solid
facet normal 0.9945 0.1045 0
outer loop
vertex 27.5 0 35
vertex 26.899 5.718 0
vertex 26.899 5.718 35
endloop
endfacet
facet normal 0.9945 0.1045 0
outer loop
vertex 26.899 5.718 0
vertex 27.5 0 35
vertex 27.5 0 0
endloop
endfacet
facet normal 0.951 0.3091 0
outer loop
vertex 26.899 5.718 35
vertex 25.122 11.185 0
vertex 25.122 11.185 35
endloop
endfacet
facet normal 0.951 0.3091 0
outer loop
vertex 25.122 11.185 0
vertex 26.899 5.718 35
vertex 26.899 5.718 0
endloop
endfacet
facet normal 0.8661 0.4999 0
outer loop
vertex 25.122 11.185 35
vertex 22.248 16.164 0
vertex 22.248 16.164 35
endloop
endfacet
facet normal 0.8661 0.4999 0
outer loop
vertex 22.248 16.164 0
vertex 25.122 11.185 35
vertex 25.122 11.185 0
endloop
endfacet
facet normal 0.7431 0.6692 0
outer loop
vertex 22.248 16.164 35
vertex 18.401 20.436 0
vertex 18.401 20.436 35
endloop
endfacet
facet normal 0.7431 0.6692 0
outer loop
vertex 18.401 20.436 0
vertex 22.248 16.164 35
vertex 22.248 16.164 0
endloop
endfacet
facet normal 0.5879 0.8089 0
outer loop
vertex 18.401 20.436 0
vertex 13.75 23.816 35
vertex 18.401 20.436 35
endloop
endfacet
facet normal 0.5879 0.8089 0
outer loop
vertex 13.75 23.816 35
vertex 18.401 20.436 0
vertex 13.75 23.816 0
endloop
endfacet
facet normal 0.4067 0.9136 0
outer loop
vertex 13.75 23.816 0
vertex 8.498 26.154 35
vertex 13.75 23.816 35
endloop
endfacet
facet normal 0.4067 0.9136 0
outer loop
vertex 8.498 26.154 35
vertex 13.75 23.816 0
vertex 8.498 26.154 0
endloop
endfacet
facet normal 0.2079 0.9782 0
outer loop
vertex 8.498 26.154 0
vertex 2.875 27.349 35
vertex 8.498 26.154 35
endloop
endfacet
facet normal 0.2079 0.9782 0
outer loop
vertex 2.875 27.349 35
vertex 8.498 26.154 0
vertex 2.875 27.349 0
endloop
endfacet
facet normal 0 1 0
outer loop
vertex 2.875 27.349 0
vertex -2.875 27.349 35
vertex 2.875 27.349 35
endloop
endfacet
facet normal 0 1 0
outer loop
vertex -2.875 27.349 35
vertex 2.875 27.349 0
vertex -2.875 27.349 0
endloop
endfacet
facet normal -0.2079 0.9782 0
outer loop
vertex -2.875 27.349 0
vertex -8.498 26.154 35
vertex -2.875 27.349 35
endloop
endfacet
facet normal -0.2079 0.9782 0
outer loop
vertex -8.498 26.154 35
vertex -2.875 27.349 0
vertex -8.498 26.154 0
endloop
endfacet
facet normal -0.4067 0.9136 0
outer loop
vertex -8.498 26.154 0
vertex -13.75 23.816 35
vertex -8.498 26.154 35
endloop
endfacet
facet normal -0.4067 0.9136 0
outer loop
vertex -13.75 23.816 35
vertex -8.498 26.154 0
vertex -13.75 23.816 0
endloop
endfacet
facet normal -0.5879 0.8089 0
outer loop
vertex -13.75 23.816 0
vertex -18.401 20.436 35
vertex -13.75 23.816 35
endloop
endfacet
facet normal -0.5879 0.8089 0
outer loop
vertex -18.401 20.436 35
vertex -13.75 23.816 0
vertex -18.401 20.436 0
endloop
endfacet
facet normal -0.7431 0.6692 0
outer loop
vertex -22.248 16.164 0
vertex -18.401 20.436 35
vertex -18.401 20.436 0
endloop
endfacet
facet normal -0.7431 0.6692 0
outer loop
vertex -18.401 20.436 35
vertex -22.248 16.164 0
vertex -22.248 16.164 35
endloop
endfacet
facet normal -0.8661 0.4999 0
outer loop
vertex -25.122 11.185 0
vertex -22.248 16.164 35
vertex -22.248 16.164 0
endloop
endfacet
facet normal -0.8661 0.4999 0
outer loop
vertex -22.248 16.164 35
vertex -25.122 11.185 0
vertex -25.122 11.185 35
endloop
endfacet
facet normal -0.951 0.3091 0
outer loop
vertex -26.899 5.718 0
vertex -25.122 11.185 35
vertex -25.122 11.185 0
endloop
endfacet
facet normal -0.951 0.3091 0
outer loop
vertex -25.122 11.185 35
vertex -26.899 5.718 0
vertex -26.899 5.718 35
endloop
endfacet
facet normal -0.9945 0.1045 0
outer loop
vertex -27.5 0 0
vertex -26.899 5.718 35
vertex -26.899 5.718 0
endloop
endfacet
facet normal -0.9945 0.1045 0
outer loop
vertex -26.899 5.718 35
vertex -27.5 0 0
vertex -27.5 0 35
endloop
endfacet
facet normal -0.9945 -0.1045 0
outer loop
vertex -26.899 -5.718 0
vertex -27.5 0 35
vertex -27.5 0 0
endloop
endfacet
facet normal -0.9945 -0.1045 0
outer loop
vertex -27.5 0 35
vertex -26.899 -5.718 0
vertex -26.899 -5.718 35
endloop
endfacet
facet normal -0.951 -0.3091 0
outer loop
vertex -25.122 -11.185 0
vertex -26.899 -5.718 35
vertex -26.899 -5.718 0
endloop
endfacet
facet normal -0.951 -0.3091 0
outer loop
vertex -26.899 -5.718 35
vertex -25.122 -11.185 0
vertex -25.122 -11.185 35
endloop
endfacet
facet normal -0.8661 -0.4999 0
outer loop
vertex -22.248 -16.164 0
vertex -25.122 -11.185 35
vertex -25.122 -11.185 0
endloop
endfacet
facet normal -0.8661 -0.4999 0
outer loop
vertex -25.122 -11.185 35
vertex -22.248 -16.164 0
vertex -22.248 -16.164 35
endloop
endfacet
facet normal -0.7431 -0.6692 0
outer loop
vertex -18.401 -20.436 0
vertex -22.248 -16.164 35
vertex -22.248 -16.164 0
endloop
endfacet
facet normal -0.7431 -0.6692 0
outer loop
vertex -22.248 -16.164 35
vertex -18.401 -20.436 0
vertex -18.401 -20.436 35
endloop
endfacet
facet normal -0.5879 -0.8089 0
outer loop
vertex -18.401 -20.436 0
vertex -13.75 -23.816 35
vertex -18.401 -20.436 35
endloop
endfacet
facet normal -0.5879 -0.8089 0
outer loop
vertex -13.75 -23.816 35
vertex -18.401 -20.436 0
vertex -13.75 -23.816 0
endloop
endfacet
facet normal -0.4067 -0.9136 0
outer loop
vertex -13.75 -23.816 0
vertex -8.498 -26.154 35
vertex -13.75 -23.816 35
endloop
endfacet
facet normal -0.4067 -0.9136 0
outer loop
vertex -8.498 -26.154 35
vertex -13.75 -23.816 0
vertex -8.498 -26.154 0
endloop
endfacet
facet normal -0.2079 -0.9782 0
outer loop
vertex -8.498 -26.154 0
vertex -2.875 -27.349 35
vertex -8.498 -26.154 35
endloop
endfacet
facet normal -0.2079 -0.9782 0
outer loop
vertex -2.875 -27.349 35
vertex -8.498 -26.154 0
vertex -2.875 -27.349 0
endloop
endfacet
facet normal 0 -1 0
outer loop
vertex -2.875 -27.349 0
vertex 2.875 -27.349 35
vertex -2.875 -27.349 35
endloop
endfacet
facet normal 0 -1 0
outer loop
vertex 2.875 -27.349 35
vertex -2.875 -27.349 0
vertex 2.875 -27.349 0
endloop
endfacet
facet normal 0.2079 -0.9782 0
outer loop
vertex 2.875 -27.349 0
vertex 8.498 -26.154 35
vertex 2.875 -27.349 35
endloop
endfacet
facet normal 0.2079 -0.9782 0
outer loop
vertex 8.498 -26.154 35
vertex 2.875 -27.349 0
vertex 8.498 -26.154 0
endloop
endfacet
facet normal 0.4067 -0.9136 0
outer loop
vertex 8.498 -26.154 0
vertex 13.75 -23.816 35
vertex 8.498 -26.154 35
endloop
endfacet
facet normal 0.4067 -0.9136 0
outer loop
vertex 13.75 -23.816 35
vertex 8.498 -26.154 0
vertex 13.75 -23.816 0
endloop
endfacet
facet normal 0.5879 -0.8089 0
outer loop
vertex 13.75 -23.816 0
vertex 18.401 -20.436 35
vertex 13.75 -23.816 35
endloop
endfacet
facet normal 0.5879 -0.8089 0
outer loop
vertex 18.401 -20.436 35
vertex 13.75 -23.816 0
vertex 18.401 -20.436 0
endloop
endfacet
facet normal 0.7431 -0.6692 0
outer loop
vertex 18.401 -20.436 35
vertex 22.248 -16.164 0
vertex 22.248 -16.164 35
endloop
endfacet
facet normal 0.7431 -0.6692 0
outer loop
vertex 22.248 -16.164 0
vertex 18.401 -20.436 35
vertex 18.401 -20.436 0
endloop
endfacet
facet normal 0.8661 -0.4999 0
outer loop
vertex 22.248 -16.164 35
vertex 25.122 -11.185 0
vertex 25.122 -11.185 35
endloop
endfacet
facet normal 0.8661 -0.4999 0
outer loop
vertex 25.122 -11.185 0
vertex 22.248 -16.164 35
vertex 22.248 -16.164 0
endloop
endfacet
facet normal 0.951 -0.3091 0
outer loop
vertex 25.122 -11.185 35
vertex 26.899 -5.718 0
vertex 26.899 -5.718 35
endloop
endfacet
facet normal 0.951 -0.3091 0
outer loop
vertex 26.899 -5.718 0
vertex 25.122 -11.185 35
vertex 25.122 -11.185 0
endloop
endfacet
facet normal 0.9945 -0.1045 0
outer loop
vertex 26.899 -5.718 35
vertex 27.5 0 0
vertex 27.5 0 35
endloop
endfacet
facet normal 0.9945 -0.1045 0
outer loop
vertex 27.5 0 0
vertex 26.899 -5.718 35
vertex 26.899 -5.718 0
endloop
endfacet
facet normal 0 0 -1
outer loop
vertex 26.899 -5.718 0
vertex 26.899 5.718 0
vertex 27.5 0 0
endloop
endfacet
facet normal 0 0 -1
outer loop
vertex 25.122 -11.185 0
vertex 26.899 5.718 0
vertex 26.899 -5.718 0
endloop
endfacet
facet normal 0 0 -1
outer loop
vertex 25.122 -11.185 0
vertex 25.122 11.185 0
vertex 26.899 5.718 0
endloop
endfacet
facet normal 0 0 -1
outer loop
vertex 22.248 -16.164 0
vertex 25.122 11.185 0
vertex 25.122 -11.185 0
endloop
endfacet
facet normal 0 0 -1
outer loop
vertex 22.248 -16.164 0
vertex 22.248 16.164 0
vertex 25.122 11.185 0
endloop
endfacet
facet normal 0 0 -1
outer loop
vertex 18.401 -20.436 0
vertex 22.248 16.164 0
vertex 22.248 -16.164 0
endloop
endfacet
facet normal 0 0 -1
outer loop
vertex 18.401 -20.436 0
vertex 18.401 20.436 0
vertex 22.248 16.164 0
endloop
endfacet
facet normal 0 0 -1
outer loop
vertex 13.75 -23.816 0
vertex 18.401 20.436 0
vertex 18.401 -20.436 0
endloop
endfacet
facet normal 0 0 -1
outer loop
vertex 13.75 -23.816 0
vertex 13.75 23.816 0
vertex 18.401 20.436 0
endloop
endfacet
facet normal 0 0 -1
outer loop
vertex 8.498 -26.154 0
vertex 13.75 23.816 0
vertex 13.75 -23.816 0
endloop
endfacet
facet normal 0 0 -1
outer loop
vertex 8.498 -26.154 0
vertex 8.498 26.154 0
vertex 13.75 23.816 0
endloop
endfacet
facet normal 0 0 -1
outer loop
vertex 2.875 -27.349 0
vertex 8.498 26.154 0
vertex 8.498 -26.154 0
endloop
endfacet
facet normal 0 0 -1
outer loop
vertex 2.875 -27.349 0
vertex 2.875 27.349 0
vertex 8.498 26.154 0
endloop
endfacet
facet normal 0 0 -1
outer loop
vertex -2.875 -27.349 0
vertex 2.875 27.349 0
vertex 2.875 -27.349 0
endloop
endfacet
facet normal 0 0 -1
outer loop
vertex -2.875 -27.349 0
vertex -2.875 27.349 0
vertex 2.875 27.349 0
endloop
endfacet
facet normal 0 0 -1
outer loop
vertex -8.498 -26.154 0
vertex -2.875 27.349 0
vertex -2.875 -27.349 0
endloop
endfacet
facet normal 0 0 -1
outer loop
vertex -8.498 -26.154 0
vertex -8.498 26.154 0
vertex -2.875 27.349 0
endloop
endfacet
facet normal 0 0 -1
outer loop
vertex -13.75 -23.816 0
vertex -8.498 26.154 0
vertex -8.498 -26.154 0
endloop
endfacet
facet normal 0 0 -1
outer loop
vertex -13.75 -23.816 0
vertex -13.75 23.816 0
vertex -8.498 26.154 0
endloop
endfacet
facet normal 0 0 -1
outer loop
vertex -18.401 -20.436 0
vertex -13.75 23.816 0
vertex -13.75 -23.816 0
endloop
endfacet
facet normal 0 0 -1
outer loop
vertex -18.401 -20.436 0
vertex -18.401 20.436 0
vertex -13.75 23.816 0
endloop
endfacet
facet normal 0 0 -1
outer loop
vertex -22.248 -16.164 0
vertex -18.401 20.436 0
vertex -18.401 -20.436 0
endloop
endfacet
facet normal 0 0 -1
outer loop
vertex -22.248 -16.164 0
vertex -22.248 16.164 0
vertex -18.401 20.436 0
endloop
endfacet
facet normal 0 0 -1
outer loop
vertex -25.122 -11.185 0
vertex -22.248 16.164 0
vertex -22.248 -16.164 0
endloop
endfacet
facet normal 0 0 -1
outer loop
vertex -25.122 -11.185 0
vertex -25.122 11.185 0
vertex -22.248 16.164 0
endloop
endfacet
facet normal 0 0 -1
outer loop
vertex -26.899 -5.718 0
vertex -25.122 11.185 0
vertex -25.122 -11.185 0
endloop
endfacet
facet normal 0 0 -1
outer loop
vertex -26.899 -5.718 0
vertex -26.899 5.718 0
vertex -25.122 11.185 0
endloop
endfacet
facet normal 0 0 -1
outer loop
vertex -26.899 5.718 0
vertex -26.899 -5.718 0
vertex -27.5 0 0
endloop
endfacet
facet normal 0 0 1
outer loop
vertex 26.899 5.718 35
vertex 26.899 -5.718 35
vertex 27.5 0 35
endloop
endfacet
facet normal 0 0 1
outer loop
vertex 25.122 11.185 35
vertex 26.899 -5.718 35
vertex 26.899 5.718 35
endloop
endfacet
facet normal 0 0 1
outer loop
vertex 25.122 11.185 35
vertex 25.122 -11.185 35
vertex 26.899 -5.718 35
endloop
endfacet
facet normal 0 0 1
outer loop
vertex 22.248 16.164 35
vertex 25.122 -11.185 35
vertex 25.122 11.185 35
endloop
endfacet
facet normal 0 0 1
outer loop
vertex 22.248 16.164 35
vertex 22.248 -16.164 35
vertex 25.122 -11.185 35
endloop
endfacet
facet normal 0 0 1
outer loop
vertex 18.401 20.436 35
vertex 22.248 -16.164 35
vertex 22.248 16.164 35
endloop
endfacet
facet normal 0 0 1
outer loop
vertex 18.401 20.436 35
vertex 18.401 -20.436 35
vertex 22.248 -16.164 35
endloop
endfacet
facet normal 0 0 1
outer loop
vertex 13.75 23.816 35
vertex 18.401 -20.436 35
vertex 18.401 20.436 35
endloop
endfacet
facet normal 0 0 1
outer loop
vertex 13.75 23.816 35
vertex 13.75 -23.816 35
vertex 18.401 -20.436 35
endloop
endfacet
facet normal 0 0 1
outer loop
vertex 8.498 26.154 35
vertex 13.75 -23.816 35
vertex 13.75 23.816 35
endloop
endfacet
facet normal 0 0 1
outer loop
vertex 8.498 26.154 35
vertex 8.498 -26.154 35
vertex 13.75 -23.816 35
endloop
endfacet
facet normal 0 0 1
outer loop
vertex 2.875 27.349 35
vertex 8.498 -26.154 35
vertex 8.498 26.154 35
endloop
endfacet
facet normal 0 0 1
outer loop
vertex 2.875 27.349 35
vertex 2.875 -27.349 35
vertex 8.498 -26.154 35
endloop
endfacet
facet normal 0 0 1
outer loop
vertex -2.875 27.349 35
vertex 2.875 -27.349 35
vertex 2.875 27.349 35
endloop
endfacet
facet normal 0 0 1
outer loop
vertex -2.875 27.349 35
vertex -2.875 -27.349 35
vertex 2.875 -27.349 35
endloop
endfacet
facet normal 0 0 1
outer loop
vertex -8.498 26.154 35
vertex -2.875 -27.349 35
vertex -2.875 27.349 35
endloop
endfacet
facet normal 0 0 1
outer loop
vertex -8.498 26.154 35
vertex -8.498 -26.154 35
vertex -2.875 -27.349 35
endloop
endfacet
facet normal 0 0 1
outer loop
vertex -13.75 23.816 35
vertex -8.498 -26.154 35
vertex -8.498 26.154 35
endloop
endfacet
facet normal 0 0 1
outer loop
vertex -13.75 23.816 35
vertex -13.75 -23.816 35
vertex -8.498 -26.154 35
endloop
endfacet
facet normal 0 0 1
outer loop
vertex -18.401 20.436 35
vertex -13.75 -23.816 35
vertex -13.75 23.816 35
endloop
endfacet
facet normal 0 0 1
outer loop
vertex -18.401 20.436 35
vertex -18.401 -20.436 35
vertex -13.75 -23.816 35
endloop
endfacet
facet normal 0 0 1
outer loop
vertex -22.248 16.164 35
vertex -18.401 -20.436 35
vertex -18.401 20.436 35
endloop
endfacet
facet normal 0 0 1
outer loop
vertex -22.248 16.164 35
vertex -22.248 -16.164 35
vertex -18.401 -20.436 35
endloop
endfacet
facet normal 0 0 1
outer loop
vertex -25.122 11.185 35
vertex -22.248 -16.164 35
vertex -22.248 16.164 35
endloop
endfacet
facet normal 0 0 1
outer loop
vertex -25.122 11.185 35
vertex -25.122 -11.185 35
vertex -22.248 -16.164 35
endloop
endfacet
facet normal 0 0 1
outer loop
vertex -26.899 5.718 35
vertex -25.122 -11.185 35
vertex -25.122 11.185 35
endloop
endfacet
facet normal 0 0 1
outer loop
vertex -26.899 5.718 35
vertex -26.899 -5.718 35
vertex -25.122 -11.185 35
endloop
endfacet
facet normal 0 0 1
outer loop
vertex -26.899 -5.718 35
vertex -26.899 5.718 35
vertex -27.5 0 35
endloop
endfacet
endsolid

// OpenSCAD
module csf1480(){
    cylinder(d=55,h=35);
    
    
    
}


csf1480();
